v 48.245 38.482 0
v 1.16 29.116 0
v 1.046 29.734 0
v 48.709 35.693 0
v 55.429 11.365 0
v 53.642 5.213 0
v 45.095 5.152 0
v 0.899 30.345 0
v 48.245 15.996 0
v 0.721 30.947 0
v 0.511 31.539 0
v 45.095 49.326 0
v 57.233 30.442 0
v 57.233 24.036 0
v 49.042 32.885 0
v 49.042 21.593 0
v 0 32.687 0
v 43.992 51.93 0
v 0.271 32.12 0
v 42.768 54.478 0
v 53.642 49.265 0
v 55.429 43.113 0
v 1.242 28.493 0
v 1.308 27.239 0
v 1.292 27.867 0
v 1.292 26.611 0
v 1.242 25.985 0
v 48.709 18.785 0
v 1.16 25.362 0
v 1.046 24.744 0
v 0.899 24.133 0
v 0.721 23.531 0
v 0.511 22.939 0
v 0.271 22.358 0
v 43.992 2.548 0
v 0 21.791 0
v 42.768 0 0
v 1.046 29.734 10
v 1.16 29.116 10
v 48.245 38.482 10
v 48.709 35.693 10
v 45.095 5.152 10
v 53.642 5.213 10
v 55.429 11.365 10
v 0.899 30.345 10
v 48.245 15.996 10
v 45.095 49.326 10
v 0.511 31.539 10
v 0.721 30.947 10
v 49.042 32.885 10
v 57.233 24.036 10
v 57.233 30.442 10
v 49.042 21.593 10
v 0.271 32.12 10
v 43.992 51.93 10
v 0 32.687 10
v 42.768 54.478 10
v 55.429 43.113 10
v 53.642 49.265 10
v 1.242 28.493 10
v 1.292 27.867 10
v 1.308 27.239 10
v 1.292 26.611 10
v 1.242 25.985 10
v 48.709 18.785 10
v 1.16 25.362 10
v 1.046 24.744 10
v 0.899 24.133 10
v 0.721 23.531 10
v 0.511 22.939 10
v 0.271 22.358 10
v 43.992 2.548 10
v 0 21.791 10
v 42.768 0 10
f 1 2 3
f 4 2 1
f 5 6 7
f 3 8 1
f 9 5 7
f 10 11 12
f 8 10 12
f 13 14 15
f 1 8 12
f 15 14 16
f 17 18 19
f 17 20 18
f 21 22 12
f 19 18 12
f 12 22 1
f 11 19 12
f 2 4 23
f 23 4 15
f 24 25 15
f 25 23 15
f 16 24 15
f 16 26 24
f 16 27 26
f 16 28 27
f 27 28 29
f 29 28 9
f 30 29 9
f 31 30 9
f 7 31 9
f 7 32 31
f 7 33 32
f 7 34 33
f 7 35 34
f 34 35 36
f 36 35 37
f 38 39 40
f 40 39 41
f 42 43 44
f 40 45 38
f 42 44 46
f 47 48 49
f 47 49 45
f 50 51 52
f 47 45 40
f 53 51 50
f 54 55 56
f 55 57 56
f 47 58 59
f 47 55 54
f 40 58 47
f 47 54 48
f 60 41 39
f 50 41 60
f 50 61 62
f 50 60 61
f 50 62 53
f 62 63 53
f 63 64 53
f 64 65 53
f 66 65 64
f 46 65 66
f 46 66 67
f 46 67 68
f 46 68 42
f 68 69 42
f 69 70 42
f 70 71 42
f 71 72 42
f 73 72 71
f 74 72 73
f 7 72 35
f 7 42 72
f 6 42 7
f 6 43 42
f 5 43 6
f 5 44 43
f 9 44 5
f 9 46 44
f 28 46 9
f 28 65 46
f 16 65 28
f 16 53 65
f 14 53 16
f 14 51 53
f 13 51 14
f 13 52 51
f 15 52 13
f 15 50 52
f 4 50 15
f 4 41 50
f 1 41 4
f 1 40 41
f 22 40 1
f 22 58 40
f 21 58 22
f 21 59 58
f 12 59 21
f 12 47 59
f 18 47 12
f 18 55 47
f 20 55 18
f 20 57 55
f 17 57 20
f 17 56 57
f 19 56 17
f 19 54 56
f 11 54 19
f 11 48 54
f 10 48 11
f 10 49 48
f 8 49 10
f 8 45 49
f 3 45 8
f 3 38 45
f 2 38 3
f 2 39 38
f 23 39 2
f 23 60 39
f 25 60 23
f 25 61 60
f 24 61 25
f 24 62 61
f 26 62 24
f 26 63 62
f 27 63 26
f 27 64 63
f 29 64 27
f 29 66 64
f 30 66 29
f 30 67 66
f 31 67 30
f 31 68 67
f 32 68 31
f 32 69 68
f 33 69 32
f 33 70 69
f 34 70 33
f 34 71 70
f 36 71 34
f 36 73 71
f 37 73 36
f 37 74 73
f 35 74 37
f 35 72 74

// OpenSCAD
$fn = 32;

// ----------------------------------------------------------------------
// Gear sector: 3 teeth on 54 degrees
// ----------------------------------------------------------------------

// --- parameters (mm) ---
sector_angle = 54;        // sector angle, degrees
root_r = 60;              // root circle radius
tooth_h = 8;              // tooth height over the root circle
teeth = 3;                // number of teeth on the sector
hub_r = 12;               // hub bore radius
plate_t = 10;             // sector thickness, Z
arc_step = 3;             // sampling step of the root/hub arcs, degrees

tip_r = root_r + tooth_h;  // tip circle radius

profile = [[42.768, 0], [43.992, 2.548], [45.095, 5.152], [53.642, 5.213], [55.429, 11.365], [48.245, 15.996], [48.709, 18.785], [49.042, 21.593], [57.233, 24.036], [57.233, 30.442], [49.042, 32.885], [48.709, 35.693], [48.245, 38.482], [55.429, 43.113], [53.642, 49.265], [45.095, 49.326], [43.992, 51.93], [42.768, 54.478], [0, 32.687], [0.271, 32.12], [0.511, 31.539], [0.721, 30.947], [0.899, 30.345], [1.046, 29.734], [1.16, 29.116], [1.242, 28.493], [1.292, 27.867], [1.308, 27.239], [1.292, 26.611], [1.242, 25.985], [1.16, 25.362], [1.046, 24.744], [0.899, 24.133], [0.721, 23.531], [0.511, 22.939], [0.271, 22.358], [0, 21.791]];  // primary outline, 37 points, counter clockwise

// --- the one profile operation ---
linear_extrude(height = plate_t) polygon(points = profile);
